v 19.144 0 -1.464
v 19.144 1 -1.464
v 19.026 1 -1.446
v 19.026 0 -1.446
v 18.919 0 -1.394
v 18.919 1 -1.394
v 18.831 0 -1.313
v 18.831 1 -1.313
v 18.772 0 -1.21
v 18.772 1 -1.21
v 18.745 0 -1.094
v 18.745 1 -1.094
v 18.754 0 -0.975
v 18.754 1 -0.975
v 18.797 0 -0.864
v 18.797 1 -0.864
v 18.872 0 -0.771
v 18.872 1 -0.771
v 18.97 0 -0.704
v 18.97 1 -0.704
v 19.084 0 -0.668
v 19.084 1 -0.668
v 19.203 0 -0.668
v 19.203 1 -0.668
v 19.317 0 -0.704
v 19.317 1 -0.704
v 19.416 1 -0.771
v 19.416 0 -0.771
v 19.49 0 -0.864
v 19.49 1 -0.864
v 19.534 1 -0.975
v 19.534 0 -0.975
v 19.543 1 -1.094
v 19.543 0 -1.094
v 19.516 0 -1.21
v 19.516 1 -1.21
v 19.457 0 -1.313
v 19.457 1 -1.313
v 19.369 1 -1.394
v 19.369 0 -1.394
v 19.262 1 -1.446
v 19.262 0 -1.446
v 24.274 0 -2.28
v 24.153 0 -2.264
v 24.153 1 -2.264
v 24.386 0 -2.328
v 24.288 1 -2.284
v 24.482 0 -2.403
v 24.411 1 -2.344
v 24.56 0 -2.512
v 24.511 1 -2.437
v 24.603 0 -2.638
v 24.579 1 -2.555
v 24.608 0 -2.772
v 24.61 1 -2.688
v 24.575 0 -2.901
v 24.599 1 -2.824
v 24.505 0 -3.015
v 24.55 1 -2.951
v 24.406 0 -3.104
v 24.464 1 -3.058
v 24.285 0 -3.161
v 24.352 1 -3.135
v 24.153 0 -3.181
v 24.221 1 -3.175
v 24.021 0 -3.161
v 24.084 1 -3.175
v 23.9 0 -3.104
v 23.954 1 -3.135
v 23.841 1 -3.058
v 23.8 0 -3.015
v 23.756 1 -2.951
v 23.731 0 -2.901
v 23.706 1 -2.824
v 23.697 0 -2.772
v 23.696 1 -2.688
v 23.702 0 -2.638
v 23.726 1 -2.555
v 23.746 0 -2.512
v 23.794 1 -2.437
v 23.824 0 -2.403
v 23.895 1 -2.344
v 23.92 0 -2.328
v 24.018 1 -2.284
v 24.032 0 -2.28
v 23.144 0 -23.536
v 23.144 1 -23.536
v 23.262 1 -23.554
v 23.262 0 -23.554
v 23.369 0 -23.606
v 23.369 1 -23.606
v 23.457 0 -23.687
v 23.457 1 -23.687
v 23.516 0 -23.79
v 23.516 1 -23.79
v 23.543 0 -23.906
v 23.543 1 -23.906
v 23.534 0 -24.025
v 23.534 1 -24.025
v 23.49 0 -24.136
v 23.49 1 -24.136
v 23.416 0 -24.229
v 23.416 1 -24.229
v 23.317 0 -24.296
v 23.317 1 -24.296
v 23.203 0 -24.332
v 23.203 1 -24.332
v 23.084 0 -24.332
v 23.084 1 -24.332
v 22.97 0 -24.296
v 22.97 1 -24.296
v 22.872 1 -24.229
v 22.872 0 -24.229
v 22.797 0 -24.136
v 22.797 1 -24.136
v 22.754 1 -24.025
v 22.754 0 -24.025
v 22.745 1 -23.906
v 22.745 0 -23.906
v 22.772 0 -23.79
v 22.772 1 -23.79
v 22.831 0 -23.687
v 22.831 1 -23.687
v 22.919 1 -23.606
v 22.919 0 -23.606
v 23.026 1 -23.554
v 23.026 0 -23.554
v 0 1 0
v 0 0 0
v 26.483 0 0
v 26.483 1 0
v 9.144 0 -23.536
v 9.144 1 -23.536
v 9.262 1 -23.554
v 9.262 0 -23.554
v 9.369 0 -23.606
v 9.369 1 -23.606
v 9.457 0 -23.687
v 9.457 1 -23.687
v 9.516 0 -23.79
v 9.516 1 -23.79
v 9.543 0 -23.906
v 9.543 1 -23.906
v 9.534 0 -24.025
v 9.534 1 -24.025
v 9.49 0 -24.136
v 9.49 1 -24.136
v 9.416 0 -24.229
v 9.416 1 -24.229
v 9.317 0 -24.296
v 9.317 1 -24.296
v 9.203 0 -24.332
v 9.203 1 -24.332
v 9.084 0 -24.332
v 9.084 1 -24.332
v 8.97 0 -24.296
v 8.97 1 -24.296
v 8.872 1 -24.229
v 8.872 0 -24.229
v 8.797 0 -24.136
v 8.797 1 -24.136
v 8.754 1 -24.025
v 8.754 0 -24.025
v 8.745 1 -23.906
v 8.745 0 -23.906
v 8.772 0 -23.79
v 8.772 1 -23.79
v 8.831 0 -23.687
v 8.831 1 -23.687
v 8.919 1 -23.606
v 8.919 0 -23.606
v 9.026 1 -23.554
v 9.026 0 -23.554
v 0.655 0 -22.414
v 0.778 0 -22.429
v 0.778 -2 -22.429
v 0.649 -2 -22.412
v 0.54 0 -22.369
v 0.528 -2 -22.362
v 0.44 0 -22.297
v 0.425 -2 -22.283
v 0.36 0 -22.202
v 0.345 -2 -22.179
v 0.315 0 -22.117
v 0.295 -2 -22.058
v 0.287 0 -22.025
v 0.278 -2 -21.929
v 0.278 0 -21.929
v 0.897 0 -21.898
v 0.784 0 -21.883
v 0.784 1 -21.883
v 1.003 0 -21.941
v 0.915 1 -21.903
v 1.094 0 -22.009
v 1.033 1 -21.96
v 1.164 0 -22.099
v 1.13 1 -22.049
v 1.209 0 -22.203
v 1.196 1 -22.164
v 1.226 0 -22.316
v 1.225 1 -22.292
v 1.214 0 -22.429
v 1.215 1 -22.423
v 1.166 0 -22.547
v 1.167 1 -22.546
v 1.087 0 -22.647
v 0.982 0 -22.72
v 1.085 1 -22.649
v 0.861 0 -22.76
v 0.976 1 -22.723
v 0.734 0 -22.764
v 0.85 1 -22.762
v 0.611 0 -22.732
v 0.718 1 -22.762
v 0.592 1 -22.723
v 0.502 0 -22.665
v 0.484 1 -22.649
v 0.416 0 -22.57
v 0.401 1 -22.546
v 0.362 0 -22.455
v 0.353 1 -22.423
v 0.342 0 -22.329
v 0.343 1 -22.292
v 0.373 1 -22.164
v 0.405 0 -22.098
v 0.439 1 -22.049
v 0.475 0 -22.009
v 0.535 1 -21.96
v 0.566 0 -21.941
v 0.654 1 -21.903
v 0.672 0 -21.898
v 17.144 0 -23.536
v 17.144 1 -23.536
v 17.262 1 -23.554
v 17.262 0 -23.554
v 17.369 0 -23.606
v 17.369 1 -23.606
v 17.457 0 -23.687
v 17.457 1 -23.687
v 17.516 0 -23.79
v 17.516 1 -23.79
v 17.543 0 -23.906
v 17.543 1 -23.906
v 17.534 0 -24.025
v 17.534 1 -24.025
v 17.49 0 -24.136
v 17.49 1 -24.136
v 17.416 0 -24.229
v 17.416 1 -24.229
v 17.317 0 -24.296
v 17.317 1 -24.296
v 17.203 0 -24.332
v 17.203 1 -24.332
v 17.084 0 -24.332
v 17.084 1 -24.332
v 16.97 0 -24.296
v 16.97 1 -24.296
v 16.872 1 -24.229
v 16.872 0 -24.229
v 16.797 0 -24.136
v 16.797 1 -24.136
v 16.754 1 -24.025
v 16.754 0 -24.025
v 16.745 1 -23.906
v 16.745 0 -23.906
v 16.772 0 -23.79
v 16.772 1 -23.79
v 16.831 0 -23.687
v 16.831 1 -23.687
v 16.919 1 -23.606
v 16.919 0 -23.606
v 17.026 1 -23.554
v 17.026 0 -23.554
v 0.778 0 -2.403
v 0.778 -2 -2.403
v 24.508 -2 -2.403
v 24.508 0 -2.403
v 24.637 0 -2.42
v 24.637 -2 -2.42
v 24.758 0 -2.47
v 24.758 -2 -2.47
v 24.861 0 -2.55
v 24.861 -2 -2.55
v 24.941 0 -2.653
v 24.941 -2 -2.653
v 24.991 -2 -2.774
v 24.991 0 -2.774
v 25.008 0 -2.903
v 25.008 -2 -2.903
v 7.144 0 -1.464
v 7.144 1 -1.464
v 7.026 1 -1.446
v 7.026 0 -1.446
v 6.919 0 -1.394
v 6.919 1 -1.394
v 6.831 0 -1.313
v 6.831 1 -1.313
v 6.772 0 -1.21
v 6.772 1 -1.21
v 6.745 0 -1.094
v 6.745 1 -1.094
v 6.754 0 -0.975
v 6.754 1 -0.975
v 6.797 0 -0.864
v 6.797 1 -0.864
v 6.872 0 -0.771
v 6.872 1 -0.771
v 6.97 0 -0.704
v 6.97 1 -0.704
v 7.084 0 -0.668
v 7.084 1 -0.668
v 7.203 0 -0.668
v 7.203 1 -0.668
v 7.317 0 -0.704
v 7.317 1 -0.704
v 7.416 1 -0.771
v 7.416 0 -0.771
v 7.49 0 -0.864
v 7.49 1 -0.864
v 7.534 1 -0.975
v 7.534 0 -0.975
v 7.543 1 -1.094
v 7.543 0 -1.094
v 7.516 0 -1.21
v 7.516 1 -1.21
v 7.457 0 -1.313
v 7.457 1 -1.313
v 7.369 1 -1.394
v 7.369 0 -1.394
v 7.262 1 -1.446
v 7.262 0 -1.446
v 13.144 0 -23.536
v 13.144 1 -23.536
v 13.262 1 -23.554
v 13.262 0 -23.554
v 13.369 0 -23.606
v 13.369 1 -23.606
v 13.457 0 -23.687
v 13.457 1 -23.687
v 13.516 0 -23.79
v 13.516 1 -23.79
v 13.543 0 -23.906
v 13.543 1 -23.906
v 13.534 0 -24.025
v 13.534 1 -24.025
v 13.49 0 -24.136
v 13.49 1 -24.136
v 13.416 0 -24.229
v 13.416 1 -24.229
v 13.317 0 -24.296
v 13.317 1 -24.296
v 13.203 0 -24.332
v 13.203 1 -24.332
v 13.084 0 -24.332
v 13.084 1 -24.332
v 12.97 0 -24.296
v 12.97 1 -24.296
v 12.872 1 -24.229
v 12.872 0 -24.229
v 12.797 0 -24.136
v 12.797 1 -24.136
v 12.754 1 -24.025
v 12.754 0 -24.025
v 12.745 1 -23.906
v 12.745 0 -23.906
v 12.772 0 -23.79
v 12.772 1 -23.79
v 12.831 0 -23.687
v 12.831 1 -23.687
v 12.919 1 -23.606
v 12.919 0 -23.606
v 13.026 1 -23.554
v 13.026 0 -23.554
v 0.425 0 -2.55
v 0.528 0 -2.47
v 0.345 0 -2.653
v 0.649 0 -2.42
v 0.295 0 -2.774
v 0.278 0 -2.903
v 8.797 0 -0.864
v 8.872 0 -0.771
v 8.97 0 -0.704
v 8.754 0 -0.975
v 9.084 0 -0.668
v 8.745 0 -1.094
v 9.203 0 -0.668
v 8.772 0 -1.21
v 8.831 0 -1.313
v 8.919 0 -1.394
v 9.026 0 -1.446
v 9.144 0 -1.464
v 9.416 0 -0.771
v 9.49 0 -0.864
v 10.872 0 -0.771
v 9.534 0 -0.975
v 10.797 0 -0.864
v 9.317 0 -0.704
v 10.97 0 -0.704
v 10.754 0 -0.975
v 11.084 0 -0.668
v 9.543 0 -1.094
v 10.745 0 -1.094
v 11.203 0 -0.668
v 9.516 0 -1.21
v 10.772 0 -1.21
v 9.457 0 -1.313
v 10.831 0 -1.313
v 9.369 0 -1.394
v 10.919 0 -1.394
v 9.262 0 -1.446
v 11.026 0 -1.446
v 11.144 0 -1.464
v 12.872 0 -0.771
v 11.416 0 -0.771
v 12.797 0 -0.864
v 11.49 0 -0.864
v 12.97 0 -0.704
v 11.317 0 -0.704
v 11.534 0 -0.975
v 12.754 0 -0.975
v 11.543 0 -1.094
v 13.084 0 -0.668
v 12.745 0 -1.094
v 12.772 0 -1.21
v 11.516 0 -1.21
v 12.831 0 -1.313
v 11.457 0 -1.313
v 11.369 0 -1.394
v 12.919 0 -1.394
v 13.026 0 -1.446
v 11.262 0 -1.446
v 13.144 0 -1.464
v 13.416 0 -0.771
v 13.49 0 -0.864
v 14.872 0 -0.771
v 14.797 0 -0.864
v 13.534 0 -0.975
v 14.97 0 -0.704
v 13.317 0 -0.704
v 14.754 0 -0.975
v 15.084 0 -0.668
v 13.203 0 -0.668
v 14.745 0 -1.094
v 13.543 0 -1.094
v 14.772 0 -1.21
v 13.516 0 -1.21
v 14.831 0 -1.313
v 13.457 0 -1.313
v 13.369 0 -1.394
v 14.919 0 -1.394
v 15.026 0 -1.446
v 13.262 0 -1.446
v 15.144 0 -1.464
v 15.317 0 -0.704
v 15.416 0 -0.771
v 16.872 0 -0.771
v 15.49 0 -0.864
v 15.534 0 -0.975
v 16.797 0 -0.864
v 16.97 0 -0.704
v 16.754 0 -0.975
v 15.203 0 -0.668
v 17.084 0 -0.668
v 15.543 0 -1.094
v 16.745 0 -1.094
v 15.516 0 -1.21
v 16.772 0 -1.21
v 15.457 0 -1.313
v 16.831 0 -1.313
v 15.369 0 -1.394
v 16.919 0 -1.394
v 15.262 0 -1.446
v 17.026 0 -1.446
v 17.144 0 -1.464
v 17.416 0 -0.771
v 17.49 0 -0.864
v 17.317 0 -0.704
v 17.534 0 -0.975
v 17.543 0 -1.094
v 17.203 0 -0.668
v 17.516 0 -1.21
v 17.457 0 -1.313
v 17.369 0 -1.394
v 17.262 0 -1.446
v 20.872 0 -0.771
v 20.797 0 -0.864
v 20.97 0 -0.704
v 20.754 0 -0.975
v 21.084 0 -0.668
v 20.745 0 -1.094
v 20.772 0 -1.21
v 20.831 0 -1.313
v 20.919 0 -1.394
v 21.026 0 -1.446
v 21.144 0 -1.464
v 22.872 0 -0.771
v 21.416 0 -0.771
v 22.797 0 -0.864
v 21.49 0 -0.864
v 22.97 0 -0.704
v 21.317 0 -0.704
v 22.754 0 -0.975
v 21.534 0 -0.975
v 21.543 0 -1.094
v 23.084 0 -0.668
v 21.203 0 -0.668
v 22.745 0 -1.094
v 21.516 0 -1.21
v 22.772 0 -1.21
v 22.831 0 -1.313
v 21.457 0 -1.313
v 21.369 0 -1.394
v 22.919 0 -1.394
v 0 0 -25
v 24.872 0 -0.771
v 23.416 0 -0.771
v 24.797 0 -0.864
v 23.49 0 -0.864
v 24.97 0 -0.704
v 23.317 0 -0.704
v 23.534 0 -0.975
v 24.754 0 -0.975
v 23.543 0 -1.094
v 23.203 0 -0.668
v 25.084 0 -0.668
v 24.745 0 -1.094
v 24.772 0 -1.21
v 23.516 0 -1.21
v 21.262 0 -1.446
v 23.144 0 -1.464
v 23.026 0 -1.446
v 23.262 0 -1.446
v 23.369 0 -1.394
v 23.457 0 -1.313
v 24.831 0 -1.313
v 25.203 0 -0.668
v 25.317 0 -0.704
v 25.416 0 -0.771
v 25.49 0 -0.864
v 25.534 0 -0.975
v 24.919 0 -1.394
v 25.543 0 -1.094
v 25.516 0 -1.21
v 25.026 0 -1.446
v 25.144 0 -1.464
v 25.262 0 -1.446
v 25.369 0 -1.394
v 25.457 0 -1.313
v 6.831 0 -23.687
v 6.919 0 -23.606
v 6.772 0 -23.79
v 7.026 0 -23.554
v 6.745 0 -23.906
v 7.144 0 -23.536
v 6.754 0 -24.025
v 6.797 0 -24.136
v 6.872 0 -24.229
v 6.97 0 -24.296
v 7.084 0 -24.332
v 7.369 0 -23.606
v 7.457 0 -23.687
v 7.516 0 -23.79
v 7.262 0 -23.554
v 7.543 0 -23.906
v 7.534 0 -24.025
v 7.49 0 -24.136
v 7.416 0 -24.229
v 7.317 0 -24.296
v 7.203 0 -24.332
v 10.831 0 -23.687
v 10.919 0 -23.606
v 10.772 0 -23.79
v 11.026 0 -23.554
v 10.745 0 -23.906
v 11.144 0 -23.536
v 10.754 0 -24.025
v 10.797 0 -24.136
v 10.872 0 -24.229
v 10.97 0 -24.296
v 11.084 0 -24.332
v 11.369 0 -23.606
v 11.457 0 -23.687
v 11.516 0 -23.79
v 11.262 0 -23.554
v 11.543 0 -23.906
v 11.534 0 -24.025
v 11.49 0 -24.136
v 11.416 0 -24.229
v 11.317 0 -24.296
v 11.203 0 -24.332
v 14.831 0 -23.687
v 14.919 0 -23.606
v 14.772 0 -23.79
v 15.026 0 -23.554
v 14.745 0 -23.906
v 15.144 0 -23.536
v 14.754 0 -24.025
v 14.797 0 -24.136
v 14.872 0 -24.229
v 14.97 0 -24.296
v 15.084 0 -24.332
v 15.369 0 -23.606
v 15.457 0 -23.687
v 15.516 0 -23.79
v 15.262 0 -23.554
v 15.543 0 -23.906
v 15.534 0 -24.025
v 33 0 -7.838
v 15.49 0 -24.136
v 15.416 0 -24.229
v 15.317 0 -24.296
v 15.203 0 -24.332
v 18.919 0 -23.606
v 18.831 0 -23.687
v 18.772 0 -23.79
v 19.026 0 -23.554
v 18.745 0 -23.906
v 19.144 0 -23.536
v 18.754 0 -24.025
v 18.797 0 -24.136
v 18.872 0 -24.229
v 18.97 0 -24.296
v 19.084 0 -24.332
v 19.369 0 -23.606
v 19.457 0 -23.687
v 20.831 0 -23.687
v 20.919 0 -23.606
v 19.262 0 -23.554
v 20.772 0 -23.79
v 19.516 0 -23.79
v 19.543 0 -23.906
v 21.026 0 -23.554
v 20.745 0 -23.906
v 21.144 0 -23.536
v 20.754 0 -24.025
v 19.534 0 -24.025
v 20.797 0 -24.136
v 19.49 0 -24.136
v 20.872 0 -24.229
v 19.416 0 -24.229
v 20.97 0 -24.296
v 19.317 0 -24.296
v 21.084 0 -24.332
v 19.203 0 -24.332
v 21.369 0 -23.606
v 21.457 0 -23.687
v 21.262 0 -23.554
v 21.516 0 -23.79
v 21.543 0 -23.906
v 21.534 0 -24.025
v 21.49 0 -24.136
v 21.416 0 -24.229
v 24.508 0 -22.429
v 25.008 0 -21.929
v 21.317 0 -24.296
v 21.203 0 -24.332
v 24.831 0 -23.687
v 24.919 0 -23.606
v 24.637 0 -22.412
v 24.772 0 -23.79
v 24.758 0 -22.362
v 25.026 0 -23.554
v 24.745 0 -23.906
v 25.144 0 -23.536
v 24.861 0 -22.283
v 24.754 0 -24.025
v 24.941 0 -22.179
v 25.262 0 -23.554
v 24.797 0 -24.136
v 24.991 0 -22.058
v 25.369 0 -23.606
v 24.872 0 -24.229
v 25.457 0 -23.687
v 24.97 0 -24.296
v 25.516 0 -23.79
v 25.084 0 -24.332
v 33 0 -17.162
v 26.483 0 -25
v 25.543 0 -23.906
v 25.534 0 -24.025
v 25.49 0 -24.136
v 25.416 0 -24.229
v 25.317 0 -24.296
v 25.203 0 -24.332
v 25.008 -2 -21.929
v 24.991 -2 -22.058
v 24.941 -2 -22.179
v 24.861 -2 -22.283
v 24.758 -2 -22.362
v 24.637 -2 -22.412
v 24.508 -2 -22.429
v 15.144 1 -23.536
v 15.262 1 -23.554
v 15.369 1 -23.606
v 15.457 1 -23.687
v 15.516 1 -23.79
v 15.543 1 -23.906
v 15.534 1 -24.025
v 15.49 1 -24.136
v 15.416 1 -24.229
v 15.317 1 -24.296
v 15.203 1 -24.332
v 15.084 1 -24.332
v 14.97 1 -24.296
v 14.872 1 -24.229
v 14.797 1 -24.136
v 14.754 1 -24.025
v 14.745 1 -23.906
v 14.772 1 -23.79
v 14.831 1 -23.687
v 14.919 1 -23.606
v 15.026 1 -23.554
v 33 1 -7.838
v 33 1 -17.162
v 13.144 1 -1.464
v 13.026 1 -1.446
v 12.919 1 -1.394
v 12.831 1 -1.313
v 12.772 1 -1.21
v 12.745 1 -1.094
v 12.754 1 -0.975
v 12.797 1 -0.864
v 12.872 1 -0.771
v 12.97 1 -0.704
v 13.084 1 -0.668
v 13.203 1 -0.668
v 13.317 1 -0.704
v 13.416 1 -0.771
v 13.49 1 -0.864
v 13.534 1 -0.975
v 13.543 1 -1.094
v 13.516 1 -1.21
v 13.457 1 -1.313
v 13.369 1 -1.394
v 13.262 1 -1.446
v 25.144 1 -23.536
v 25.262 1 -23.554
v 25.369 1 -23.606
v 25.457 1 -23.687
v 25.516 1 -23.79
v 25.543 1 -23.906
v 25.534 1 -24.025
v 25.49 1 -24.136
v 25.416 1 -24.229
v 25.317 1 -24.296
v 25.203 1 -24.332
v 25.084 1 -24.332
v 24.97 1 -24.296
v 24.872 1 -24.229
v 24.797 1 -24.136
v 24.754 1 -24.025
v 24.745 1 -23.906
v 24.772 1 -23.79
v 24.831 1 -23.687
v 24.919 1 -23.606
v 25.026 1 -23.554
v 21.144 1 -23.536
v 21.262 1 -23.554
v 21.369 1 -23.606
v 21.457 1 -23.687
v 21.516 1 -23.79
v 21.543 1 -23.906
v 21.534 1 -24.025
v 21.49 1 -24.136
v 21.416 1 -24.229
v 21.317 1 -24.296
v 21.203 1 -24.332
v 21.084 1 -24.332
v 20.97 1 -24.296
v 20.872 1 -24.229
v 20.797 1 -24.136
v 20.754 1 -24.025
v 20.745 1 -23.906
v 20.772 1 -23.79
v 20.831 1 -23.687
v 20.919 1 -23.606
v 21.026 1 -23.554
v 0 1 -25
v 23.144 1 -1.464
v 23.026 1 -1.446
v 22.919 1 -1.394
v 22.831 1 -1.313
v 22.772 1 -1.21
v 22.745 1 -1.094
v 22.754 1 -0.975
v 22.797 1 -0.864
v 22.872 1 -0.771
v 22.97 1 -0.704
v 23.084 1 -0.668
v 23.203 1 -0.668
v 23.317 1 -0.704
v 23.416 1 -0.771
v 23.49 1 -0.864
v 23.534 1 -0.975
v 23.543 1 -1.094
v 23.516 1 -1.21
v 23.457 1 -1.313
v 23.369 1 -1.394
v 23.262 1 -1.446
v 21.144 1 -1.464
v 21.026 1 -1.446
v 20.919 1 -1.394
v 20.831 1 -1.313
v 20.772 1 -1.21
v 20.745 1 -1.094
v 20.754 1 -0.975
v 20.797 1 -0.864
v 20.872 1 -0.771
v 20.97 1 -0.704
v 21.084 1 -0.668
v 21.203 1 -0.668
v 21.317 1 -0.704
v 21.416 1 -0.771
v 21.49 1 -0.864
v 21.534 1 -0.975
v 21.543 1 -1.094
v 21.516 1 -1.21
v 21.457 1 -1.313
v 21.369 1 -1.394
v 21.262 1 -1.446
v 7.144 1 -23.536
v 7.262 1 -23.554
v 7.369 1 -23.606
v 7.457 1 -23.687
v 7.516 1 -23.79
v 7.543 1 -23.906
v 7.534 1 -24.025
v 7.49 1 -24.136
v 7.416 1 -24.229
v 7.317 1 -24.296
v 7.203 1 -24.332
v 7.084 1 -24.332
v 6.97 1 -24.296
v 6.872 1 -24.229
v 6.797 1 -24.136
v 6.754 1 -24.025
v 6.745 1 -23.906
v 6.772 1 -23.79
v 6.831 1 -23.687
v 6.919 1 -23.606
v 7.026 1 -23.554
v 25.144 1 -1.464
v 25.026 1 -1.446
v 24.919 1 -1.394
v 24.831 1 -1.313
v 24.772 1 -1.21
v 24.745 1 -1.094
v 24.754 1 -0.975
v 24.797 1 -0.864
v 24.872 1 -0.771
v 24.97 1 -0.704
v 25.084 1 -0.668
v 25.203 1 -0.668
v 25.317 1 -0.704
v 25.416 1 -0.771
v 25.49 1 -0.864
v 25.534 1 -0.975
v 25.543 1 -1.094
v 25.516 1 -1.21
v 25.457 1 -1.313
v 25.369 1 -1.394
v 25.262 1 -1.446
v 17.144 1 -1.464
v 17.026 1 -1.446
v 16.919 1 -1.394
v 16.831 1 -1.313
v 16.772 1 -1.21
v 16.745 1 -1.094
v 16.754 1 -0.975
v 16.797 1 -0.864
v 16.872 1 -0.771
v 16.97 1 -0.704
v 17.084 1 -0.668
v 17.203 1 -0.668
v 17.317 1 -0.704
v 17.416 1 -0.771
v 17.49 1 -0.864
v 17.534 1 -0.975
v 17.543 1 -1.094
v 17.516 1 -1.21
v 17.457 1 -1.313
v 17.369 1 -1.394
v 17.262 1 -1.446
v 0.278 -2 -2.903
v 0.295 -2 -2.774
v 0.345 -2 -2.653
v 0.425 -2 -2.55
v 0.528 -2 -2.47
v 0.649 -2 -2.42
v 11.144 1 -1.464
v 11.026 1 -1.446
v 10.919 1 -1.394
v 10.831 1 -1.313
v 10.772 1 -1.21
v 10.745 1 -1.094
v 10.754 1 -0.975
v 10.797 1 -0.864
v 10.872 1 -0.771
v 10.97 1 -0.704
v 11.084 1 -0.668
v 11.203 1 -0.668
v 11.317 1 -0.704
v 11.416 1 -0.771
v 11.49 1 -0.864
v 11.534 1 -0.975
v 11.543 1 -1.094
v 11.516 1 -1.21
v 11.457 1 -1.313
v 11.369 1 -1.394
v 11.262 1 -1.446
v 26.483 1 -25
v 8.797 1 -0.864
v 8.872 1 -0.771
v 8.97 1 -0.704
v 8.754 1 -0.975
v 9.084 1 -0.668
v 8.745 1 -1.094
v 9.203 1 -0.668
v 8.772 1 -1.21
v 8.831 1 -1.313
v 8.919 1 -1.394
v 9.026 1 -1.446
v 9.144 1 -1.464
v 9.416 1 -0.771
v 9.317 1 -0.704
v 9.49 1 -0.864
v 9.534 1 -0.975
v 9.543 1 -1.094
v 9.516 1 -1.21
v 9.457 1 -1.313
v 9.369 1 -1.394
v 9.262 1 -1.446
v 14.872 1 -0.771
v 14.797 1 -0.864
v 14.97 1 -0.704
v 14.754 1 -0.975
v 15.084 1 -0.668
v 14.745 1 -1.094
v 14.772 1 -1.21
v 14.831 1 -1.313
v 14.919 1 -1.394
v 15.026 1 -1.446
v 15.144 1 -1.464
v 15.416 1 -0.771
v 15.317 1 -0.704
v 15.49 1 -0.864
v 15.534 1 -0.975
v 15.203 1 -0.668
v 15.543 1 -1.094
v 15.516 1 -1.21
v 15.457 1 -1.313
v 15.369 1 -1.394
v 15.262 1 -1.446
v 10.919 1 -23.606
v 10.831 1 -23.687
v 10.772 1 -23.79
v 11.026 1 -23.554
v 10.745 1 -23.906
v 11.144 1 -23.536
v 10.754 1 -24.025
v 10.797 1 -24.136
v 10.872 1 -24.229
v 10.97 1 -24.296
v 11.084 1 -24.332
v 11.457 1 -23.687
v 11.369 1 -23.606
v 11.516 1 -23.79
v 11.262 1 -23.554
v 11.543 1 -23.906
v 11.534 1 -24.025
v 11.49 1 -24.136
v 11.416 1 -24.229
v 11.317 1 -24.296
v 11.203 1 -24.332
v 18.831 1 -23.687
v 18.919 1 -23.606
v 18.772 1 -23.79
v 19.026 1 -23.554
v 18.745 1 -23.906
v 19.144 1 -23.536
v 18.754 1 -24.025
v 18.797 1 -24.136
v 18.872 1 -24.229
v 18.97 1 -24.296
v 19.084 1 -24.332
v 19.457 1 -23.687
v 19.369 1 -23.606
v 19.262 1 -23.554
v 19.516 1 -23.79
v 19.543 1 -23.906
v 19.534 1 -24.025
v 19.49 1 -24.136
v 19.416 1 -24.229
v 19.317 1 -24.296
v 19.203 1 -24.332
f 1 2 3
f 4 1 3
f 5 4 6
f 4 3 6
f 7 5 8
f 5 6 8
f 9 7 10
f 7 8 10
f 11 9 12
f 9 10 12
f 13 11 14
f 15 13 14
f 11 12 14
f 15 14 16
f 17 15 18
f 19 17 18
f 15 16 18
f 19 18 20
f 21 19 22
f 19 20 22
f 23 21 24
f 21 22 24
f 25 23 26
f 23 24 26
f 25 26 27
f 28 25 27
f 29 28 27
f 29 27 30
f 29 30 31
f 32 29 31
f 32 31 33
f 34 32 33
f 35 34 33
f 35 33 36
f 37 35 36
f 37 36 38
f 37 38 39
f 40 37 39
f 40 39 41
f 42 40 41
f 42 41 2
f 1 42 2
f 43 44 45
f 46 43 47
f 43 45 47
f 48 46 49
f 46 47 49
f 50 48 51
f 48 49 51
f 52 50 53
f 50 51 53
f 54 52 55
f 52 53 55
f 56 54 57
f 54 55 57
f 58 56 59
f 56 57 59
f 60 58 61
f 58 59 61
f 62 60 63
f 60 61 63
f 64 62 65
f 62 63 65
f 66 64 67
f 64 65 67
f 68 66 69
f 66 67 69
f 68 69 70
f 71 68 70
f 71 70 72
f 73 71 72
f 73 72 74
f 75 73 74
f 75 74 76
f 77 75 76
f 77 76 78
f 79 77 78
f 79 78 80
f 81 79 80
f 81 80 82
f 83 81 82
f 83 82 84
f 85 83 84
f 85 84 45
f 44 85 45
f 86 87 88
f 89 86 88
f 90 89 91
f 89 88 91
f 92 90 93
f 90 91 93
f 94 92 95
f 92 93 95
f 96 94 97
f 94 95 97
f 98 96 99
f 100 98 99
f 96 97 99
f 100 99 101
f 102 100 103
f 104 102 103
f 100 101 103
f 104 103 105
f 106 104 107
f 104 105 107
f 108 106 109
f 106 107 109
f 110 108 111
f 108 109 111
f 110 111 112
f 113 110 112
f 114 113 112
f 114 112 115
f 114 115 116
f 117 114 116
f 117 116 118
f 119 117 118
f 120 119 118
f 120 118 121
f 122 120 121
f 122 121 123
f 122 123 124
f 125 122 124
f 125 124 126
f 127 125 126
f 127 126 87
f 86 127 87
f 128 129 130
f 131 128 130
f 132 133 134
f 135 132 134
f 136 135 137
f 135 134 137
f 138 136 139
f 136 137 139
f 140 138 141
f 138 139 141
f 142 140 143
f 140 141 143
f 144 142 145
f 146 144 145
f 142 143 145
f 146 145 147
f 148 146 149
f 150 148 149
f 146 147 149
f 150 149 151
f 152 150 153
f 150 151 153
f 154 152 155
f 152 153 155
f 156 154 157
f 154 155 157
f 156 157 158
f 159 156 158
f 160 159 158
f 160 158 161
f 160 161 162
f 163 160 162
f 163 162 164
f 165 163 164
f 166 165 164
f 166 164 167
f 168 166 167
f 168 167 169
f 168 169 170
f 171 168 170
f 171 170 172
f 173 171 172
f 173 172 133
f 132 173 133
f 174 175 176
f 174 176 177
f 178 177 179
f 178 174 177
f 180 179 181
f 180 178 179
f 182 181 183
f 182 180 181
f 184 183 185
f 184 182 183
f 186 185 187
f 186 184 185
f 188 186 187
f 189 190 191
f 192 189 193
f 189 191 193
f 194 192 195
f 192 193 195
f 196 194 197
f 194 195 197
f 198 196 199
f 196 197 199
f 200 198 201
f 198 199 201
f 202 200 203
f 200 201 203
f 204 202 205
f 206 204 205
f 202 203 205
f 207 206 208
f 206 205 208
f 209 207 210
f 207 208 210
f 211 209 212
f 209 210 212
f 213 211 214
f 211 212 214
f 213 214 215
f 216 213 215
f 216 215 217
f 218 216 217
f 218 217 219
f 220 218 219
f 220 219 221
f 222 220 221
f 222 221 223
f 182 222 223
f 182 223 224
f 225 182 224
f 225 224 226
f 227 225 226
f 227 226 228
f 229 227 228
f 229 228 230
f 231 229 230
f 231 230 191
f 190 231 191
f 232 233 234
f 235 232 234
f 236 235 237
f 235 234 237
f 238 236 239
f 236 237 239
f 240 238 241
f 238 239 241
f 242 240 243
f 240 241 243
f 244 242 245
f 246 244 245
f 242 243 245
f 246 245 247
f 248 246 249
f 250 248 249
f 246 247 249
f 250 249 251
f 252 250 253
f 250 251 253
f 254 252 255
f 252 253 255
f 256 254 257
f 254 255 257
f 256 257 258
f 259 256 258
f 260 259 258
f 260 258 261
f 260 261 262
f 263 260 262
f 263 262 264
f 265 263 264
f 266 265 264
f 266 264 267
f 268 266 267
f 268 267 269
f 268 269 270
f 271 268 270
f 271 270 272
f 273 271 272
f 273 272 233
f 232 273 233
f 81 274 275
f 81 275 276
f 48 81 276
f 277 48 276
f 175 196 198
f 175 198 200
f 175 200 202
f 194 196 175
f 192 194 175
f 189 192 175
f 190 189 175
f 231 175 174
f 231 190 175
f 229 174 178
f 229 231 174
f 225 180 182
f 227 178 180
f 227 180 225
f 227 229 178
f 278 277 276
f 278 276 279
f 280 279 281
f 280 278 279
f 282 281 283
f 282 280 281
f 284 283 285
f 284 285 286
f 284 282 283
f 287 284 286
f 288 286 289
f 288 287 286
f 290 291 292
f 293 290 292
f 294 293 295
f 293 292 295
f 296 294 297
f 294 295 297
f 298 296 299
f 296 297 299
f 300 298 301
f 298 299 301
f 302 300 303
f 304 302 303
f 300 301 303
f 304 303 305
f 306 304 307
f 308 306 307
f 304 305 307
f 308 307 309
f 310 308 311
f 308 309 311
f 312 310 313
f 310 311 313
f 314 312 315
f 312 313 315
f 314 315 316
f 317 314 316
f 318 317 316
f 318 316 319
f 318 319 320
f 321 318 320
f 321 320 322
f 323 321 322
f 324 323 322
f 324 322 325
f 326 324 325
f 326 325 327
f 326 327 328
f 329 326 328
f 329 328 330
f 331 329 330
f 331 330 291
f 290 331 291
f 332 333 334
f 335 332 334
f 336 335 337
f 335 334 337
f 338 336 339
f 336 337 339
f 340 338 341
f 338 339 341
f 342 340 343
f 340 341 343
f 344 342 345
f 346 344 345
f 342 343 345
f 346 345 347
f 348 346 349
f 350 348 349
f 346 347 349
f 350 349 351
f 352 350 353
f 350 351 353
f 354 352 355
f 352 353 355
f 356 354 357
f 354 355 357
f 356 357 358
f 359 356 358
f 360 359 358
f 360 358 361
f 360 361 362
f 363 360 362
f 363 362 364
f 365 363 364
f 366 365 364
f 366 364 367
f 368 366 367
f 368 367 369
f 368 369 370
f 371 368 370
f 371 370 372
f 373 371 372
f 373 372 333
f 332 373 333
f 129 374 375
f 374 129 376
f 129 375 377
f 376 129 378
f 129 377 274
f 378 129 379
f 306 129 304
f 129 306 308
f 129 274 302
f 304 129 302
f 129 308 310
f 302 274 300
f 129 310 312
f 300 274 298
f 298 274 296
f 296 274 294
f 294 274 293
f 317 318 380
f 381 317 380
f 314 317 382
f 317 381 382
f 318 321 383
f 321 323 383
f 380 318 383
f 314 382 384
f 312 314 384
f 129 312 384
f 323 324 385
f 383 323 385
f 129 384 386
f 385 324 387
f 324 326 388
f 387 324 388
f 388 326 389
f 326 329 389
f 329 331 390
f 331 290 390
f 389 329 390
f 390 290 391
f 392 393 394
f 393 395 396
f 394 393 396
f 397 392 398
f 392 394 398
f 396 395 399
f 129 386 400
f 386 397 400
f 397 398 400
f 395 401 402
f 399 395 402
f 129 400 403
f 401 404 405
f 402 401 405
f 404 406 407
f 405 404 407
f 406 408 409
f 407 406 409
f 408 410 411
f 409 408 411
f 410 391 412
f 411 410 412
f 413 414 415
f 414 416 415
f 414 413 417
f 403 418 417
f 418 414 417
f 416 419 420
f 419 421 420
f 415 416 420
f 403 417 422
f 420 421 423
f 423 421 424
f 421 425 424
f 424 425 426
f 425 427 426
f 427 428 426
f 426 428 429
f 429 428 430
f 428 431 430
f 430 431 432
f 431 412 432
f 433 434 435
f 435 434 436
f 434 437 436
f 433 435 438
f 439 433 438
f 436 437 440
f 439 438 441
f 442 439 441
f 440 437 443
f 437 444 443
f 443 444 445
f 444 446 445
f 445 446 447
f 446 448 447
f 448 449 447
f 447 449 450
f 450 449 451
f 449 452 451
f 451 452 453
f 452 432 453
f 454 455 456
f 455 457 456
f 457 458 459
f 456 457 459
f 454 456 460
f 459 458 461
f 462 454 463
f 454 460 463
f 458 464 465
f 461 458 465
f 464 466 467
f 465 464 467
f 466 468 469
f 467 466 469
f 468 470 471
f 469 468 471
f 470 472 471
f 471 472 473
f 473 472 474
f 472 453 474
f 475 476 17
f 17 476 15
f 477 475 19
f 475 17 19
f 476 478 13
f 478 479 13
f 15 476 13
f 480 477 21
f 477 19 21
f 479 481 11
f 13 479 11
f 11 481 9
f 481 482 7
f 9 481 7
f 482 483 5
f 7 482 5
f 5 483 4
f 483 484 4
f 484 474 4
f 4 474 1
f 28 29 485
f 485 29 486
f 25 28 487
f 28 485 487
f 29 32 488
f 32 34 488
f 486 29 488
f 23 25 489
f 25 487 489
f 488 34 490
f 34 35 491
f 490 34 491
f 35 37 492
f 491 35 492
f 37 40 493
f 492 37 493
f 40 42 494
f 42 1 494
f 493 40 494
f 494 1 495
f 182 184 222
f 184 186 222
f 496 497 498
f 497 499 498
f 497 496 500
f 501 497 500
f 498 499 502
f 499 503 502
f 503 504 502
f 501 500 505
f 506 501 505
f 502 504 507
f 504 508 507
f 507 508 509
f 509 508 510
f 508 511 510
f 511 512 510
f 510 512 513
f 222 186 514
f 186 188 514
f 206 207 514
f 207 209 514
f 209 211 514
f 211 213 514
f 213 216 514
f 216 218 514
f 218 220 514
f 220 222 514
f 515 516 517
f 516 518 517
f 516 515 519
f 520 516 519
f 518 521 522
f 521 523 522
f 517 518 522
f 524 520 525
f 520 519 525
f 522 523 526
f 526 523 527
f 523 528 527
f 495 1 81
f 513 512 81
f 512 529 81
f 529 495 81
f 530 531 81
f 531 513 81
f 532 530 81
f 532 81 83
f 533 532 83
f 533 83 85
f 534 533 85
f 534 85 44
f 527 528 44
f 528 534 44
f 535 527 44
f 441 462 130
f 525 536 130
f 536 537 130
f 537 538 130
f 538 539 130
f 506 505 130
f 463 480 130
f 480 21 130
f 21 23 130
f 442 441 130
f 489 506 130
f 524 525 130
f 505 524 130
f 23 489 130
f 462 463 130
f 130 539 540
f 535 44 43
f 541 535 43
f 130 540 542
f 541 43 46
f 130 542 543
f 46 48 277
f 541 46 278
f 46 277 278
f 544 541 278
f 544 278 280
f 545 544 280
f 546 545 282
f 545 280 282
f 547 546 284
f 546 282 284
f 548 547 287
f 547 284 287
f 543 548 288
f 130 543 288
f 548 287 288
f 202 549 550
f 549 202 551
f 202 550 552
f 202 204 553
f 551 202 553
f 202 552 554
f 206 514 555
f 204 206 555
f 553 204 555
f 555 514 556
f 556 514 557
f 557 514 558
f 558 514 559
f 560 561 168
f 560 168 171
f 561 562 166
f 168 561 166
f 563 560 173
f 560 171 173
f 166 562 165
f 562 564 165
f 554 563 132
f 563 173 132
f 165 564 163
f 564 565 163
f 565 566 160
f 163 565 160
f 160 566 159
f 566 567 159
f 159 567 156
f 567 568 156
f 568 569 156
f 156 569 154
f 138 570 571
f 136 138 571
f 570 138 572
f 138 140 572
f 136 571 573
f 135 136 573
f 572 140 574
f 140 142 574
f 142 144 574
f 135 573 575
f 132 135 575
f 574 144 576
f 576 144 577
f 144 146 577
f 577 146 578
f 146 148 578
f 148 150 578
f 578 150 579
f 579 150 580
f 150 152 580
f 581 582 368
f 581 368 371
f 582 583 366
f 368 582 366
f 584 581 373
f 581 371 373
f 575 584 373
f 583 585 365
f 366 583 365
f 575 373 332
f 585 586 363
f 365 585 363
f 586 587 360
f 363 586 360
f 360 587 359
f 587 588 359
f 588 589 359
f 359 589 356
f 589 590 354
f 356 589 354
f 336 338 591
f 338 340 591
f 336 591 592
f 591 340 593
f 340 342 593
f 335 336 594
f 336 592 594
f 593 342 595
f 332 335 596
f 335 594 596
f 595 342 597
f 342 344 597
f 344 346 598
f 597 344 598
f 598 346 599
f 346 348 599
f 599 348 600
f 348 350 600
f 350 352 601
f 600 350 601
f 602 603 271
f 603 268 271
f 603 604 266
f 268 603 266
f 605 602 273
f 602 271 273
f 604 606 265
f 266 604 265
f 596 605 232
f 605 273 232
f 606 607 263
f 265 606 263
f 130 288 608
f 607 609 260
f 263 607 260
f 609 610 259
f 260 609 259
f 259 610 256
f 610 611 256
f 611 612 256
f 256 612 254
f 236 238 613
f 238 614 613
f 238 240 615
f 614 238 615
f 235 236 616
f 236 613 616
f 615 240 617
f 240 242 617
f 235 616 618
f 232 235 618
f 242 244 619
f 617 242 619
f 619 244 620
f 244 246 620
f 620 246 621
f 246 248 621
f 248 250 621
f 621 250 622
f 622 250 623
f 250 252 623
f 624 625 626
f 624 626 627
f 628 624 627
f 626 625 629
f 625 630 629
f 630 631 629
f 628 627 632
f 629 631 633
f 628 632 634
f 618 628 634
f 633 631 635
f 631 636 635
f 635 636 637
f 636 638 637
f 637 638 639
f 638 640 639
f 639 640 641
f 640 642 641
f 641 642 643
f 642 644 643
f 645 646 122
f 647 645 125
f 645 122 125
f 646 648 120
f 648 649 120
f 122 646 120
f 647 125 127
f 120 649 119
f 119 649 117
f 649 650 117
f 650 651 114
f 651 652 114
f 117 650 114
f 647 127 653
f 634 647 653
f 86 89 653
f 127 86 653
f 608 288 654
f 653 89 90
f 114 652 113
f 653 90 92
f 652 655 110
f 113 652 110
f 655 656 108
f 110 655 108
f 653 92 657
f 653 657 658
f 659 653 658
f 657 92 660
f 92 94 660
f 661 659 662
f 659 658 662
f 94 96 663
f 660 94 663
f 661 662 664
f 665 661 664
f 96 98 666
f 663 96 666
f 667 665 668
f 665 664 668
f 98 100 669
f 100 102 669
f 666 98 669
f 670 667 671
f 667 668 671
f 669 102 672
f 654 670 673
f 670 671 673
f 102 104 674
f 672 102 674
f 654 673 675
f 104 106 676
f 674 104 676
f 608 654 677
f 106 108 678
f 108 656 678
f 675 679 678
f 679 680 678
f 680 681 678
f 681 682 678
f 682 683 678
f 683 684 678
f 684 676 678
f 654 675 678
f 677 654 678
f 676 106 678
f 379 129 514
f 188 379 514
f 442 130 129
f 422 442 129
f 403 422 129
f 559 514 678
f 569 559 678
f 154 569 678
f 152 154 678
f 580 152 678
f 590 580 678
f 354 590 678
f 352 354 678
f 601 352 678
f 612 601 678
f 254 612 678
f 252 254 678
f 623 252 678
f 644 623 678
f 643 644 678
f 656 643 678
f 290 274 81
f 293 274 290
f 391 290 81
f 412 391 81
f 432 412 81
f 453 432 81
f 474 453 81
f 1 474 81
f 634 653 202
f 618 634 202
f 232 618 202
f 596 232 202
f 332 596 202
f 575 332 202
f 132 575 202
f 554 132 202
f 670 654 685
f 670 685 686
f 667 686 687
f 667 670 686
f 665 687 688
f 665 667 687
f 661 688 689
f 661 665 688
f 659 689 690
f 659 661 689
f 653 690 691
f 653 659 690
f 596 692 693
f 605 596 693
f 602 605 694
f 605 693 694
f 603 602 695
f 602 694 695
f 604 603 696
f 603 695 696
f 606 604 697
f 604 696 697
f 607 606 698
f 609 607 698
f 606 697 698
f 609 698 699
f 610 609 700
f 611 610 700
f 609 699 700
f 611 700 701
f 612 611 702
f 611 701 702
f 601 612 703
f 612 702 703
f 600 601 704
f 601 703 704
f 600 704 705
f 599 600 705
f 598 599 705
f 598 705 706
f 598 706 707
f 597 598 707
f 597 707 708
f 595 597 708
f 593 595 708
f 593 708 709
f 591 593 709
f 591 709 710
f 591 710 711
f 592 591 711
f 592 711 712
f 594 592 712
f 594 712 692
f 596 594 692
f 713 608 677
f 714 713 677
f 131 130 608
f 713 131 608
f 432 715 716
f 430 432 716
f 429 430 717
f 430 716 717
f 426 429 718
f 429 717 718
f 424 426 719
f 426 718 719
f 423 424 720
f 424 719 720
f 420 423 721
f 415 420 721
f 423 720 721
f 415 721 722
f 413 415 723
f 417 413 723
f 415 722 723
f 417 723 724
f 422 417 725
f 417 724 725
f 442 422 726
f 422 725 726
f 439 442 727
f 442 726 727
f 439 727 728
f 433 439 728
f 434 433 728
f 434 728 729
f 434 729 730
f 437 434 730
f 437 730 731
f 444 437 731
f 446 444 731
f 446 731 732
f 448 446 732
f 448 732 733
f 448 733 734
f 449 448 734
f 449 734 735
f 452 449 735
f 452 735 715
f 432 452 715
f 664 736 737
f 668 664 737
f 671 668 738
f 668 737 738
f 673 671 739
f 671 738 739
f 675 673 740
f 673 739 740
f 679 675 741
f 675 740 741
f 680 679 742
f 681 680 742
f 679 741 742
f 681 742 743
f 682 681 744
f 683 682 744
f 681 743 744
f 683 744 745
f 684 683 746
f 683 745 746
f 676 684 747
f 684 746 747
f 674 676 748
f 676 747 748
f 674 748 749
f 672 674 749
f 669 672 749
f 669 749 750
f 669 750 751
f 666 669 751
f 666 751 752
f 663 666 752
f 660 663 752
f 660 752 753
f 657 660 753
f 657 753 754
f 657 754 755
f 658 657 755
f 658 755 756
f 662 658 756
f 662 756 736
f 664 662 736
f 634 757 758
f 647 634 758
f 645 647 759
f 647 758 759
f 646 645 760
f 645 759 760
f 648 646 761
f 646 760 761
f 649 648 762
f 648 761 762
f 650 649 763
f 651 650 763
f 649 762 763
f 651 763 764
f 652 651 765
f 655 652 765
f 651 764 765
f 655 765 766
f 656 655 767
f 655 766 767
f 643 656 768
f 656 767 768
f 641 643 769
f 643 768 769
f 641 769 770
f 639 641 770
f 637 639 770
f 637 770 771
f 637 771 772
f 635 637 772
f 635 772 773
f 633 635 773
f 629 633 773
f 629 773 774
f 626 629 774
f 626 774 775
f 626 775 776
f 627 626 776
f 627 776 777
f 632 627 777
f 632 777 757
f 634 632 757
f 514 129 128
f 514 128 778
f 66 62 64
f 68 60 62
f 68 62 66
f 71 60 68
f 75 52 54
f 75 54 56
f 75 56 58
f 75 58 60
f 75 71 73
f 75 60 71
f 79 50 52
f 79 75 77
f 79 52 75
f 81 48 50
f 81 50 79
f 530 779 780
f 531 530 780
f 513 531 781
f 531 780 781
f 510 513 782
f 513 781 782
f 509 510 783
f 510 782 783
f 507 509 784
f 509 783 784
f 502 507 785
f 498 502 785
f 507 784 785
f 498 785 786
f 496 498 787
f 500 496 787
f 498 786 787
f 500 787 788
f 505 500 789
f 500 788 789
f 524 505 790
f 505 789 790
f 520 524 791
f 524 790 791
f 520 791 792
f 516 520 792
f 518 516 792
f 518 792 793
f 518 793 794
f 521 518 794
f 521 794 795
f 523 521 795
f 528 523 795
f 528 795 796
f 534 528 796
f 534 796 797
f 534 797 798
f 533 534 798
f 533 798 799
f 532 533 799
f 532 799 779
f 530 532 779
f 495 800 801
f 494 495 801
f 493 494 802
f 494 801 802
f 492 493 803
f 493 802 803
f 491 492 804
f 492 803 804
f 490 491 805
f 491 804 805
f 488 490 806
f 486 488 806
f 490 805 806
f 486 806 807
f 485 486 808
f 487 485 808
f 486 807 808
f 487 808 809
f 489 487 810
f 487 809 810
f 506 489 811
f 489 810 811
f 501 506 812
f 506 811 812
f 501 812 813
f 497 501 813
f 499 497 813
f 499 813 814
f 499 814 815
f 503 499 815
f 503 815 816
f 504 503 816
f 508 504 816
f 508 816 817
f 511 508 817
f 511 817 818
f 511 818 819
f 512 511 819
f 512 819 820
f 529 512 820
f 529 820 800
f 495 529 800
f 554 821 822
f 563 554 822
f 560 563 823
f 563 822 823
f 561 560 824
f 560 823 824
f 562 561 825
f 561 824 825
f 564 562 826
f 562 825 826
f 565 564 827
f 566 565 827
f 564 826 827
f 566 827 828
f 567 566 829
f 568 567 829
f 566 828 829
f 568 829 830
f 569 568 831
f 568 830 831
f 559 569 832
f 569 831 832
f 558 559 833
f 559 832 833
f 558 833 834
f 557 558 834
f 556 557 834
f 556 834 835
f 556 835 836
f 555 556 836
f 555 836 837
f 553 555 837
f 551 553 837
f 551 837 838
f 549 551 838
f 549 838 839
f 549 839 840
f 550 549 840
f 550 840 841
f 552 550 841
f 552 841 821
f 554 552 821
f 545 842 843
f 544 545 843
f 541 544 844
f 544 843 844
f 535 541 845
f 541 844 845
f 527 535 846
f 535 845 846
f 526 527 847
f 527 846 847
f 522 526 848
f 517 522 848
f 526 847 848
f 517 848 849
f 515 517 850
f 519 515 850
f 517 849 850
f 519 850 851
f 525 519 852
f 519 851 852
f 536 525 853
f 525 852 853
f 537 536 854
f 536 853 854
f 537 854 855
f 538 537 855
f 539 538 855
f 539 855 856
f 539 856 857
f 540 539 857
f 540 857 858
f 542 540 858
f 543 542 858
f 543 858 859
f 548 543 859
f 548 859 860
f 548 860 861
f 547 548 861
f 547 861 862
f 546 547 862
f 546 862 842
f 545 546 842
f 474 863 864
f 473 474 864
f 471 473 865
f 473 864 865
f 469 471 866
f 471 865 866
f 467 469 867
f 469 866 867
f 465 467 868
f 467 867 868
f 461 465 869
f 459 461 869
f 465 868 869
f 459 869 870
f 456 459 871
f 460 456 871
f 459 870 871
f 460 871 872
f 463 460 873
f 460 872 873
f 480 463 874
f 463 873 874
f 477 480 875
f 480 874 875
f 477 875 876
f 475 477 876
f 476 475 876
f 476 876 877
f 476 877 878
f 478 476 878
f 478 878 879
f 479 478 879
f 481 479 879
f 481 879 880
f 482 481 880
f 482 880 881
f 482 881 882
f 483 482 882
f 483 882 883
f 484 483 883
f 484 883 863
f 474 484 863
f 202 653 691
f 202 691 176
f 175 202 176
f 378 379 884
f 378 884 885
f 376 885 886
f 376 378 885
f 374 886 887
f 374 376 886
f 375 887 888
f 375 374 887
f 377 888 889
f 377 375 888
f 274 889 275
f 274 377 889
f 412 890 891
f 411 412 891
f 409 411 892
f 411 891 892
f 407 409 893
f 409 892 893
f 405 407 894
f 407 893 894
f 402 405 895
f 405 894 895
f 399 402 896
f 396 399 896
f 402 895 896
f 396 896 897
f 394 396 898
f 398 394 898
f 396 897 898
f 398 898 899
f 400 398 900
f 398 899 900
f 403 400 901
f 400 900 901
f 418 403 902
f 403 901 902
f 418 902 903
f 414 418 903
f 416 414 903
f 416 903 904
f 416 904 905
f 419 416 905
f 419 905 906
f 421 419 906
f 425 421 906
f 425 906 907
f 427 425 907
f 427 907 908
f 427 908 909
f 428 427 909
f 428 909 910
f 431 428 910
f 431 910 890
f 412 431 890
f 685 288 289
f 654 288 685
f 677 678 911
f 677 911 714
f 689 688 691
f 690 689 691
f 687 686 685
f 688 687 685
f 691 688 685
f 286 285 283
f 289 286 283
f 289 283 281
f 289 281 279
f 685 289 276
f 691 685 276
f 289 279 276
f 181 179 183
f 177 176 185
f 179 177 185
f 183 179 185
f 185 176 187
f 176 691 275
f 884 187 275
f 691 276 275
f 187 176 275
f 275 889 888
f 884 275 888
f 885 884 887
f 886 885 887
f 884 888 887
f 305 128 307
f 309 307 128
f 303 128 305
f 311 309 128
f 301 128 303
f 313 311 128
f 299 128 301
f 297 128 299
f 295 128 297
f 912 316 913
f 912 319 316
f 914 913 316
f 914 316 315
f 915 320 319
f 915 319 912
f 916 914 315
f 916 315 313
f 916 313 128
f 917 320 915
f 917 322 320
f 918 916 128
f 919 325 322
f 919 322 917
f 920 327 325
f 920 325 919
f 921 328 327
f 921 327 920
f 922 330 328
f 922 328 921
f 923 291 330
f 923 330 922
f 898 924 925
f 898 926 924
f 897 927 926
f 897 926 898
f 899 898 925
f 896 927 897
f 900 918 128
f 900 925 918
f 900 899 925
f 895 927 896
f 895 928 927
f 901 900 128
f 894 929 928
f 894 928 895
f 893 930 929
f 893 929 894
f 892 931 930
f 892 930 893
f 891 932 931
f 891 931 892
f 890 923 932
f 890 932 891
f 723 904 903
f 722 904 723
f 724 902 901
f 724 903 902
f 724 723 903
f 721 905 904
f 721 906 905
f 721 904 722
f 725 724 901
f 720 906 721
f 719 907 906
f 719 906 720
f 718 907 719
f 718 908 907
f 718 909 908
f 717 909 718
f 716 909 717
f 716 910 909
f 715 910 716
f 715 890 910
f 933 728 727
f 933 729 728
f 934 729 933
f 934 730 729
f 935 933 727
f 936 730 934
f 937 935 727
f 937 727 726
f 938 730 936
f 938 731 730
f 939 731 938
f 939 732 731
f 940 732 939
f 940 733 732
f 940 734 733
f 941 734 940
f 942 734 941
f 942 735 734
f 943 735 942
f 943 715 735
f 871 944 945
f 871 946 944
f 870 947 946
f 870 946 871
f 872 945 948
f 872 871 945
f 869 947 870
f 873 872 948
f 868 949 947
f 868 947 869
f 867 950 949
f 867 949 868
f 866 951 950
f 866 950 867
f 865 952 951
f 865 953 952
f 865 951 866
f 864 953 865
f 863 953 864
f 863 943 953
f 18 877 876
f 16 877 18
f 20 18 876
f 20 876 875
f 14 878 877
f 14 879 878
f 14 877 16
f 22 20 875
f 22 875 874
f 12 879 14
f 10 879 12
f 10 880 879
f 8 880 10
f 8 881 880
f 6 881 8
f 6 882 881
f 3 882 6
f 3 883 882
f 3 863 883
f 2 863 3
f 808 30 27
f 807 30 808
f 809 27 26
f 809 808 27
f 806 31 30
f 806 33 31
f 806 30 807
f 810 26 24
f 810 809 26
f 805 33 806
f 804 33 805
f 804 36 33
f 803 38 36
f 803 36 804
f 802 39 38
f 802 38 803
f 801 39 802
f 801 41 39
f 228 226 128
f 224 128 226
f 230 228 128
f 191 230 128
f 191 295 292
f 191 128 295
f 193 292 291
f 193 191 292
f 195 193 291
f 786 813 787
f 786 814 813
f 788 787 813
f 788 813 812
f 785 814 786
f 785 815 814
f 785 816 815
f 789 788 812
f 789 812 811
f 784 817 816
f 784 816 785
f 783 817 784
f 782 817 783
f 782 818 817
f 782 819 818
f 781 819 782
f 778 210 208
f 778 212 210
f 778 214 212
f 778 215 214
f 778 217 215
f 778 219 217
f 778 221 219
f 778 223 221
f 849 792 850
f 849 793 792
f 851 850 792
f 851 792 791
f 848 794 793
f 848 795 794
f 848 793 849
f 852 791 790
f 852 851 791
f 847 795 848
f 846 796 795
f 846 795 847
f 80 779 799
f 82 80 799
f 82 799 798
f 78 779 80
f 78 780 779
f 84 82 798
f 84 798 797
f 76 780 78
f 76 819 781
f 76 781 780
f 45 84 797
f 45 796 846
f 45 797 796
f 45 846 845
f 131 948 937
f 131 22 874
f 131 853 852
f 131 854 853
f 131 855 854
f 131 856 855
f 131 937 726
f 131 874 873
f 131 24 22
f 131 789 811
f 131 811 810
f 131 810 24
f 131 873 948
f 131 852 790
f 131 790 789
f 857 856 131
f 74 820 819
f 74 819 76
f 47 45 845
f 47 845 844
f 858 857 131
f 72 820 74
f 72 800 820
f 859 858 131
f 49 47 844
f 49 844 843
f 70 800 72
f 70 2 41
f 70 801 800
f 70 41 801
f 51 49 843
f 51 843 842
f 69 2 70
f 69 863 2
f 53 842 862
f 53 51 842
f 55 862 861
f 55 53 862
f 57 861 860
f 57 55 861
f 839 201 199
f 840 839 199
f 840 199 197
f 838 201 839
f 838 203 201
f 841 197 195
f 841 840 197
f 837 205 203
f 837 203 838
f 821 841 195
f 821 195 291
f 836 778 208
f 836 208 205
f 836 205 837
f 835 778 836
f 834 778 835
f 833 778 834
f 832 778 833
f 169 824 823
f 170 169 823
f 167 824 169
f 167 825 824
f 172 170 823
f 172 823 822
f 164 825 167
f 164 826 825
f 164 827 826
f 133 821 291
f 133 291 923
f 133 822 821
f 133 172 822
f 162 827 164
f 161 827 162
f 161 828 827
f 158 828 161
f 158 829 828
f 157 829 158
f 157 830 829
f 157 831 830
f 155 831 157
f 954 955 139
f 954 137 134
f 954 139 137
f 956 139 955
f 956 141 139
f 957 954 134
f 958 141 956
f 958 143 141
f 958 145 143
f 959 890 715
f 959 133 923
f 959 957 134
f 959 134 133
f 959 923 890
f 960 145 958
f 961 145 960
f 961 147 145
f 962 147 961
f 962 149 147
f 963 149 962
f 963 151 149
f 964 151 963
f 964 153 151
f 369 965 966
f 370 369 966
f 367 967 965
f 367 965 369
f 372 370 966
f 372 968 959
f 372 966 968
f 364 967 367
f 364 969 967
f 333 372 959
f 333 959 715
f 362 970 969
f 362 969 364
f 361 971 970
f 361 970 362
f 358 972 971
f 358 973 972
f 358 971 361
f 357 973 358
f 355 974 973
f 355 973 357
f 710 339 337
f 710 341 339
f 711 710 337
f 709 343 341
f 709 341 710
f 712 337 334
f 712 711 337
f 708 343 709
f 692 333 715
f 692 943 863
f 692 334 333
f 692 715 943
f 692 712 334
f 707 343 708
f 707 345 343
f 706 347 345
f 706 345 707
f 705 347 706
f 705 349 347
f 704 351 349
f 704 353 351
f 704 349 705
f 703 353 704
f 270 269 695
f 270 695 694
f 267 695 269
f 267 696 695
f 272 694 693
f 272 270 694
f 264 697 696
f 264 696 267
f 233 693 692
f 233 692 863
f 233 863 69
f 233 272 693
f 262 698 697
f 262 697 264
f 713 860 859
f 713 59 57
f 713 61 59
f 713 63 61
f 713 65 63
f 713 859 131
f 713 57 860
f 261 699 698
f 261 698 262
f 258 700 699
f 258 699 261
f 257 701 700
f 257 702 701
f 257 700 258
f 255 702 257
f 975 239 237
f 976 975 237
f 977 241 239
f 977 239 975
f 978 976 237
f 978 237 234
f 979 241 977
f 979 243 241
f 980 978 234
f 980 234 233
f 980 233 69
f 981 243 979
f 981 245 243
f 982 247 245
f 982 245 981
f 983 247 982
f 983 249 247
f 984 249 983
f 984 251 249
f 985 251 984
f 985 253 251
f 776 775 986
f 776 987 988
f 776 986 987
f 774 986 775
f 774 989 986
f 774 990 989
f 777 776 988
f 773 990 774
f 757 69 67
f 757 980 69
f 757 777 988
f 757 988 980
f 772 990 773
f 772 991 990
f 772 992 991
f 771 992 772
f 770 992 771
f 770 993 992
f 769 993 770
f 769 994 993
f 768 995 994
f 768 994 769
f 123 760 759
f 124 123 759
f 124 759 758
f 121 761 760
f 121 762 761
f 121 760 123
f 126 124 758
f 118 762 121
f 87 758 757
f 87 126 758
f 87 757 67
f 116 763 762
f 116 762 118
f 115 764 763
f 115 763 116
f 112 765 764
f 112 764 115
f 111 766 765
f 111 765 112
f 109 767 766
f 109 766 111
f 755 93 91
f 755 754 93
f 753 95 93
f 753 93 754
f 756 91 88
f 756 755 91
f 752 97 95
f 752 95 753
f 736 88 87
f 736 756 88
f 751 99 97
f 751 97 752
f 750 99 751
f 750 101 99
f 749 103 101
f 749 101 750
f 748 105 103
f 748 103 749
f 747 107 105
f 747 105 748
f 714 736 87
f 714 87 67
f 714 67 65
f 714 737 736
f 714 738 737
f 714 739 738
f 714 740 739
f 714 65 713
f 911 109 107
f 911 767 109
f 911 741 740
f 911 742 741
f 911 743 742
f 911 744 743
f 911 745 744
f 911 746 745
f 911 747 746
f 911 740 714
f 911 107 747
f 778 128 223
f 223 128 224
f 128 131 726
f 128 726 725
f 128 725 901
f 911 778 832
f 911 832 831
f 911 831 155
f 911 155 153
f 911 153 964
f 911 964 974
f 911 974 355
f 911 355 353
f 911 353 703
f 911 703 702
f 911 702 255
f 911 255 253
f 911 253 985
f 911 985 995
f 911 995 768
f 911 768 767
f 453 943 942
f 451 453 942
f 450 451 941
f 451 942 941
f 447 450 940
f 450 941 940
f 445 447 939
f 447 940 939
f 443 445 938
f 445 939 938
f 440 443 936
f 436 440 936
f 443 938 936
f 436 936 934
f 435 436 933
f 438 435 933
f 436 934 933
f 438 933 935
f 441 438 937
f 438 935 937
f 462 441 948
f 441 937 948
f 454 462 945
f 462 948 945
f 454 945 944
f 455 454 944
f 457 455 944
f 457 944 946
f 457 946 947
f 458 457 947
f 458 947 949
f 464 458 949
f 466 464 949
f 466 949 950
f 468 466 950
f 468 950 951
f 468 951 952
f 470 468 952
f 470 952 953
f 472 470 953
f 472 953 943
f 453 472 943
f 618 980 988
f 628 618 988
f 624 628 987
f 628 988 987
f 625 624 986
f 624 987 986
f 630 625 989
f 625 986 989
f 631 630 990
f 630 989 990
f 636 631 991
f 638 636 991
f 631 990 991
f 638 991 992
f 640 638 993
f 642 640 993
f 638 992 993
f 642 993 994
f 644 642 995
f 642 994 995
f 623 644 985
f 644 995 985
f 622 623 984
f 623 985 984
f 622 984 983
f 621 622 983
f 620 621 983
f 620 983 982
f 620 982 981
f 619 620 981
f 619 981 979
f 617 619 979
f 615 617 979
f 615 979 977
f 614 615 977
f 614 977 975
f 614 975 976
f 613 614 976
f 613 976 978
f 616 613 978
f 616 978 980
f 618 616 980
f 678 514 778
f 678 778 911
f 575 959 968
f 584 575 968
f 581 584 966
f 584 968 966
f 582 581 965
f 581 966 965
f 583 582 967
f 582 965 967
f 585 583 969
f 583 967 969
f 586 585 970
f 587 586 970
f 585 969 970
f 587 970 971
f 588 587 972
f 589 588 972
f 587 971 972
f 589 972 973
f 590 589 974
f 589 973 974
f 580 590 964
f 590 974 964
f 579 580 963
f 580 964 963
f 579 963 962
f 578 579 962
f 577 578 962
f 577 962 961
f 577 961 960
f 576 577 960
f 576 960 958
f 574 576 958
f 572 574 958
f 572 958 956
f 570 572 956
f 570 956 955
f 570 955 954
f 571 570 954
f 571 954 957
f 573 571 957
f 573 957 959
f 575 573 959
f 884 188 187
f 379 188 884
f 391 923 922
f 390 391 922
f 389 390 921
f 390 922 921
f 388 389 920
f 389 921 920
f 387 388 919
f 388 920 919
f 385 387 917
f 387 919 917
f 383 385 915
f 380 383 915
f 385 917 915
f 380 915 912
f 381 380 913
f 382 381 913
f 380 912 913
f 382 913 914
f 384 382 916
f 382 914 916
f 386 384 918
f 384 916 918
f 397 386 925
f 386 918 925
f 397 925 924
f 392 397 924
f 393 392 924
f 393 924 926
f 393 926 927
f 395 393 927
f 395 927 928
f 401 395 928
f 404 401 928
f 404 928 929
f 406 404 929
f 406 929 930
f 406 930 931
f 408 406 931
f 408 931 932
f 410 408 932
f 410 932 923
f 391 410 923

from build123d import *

# Parameters (mm, degrees)
SKETCH1_W           = 33
SKETCH1_H           = 25
BOSS_EXTRUDE1_DEPTH = 1
CUT_EXTRUDE1_DEPTH  = 42.412558482
SKETCH3_R           = 0.4
SKETCH3_R_2         = 0.442084783
SKETCH3_R_3         = 0.458227678
CUT_EXTRUDE2_DEPTH  = 42.412558482
BOSS_EXTRUDE3_DEPTH = 2


with BuildPart() as part:
    # Sketch1 → Boss-Extrude1 (new body)
    with BuildSketch(Plane(origin=(0, 0, 0), x_dir=(1, 0, 0), z_dir=(0, 1, 0))):
        with Locations((16.5, 12.5)):
            Rectangle(SKETCH1_W, SKETCH1_H)
    extrude(amount=BOSS_EXTRUDE1_DEPTH)

    # Sketch2 → Cut-Extrude1 (cut, through all)
    with BuildSketch(Plane.XZ):
        Polygon((33, 0), (26.482981269, 0), (33, -7.837809095), align=None)
        Polygon((33, -17.162190905), (33, -25), (26.482981269, -25), align=None)
    extrude(amount=-CUT_EXTRUDE1_DEPTH, mode=Mode.SUBTRACT)

    # Sketch3 → Cut-Extrude2 (cut, through all)
    with BuildSketch(Plane(origin=(0, 1, 0), x_dir=(1, 0, 0), z_dir=(0, 1, 0))):
        with Locations(Location((7.143852183, 23.936106005, 0), (0, 0, 270))):
            Circle(SKETCH3_R)
        with Locations(Location((9.143852183, 23.936106005, 0), (0, 0, 270))):
            Circle(SKETCH3_R)
        with Locations(Location((11.143852183, 23.936106005, 0), (0, 0, 270))):
            Circle(SKETCH3_R)
        with Locations(Location((13.143852183, 23.936106005, 0), (0, 0, 270))):
            Circle(SKETCH3_R)
        with Locations(Location((15.143852183, 23.936106005, 0), (0, 0, 270))):
            Circle(SKETCH3_R)
        with Locations(Location((17.143852183, 23.936106005, 0), (0, 0, 270))):
            Circle(SKETCH3_R)
        with Locations(Location((19.143852183, 23.936106005, 0), (0, 0, 270))):
            Circle(SKETCH3_R)
        with Locations(Location((21.143852183, 23.936106005, 0), (0, 0, 270))):
            Circle(SKETCH3_R)
        with Locations(Location((23.143852183, 23.936106005, 0), (0, 0, 270))):
            Circle(SKETCH3_R)
        with Locations(Location((25.143852183, 23.936106005, 0), (0, 0, 270))):
            Circle(SKETCH3_R)
        with Locations(Location((25.143852183, 1.063893995, 0), (0, 0, 90))):
            Circle(SKETCH3_R)
        with Locations(Location((23.143852183, 1.063893995, 0), (0, 0, 90))):
            Circle(SKETCH3_R)
        with Locations(Location((21.143852183, 1.063893995, 0), (0, 0, 90))):
            Circle(SKETCH3_R)
        with Locations(Location((19.143852183, 1.063893995, 0), (0, 0, 90))):
            Circle(SKETCH3_R)
        with Locations(Location((17.143852183, 1.063893995, 0), (0, 0, 90))):
            Circle(SKETCH3_R)
        with Locations(Location((15.143852183, 1.063893995, 0), (0, 0, 90))):
            Circle(SKETCH3_R)
        with Locations(Location((13.143852183, 1.063893995, 0), (0, 0, 90))):
            Circle(SKETCH3_R)
        with Locations(Location((11.143852183, 1.063893995, 0), (0, 0, 90))):
            Circle(SKETCH3_R)
        with Locations(Location((9.143852183, 1.063893995, 0), (0, 0, 90))):
            Circle(SKETCH3_R)
        with Locations(Location((7.143852183, 1.063893995, 0), (0, 0, 90))):
            Circle(SKETCH3_R)
        with Locations(Location((0.784299075, 22.325061426, 0), (0, 0, 270))):
            Circle(SKETCH3_R_2)
        with Locations(Location((24.152709784, 2.722277331, 0), (0, 0, 270))):
            Circle(SKETCH3_R_3)
    extrude(amount=-CUT_EXTRUDE2_DEPTH, mode=Mode.SUBTRACT)

    # Sketch6 → Boss-Extrude3 (add)
    with BuildSketch(Plane.XZ):
        with BuildLine():
            Line((24.507853381, -22.428957603), (0.778175079, -22.428957603))
            ThreePointArc((0.778175079, -22.428957603), (0.424621688, -22.282510994), (0.278175079, -21.928957603))
            Line((0.278175079, -21.928957603), (0.278175079, -2.903294195))
            ThreePointArc((0.278175079, -2.903294195), (0.424621688, -2.549740805), (0.778175079, -2.403294195))
            Line((0.778175079, -2.403294195), (24.507853381, -2.403294195))
            ThreePointArc((24.507853381, -2.403294195), (24.861406772, -2.549740805), (25.007853381, -2.903294195))
            Line((25.007853381, -2.903294195), (25.007853381, -21.928957603))
            ThreePointArc((25.007853381, -21.928957603), (24.861406772, -22.282510994), (24.507853381, -22.428957603))
        make_face()
    extrude(amount=BOSS_EXTRUDE3_DEPTH)


solid = part.part
